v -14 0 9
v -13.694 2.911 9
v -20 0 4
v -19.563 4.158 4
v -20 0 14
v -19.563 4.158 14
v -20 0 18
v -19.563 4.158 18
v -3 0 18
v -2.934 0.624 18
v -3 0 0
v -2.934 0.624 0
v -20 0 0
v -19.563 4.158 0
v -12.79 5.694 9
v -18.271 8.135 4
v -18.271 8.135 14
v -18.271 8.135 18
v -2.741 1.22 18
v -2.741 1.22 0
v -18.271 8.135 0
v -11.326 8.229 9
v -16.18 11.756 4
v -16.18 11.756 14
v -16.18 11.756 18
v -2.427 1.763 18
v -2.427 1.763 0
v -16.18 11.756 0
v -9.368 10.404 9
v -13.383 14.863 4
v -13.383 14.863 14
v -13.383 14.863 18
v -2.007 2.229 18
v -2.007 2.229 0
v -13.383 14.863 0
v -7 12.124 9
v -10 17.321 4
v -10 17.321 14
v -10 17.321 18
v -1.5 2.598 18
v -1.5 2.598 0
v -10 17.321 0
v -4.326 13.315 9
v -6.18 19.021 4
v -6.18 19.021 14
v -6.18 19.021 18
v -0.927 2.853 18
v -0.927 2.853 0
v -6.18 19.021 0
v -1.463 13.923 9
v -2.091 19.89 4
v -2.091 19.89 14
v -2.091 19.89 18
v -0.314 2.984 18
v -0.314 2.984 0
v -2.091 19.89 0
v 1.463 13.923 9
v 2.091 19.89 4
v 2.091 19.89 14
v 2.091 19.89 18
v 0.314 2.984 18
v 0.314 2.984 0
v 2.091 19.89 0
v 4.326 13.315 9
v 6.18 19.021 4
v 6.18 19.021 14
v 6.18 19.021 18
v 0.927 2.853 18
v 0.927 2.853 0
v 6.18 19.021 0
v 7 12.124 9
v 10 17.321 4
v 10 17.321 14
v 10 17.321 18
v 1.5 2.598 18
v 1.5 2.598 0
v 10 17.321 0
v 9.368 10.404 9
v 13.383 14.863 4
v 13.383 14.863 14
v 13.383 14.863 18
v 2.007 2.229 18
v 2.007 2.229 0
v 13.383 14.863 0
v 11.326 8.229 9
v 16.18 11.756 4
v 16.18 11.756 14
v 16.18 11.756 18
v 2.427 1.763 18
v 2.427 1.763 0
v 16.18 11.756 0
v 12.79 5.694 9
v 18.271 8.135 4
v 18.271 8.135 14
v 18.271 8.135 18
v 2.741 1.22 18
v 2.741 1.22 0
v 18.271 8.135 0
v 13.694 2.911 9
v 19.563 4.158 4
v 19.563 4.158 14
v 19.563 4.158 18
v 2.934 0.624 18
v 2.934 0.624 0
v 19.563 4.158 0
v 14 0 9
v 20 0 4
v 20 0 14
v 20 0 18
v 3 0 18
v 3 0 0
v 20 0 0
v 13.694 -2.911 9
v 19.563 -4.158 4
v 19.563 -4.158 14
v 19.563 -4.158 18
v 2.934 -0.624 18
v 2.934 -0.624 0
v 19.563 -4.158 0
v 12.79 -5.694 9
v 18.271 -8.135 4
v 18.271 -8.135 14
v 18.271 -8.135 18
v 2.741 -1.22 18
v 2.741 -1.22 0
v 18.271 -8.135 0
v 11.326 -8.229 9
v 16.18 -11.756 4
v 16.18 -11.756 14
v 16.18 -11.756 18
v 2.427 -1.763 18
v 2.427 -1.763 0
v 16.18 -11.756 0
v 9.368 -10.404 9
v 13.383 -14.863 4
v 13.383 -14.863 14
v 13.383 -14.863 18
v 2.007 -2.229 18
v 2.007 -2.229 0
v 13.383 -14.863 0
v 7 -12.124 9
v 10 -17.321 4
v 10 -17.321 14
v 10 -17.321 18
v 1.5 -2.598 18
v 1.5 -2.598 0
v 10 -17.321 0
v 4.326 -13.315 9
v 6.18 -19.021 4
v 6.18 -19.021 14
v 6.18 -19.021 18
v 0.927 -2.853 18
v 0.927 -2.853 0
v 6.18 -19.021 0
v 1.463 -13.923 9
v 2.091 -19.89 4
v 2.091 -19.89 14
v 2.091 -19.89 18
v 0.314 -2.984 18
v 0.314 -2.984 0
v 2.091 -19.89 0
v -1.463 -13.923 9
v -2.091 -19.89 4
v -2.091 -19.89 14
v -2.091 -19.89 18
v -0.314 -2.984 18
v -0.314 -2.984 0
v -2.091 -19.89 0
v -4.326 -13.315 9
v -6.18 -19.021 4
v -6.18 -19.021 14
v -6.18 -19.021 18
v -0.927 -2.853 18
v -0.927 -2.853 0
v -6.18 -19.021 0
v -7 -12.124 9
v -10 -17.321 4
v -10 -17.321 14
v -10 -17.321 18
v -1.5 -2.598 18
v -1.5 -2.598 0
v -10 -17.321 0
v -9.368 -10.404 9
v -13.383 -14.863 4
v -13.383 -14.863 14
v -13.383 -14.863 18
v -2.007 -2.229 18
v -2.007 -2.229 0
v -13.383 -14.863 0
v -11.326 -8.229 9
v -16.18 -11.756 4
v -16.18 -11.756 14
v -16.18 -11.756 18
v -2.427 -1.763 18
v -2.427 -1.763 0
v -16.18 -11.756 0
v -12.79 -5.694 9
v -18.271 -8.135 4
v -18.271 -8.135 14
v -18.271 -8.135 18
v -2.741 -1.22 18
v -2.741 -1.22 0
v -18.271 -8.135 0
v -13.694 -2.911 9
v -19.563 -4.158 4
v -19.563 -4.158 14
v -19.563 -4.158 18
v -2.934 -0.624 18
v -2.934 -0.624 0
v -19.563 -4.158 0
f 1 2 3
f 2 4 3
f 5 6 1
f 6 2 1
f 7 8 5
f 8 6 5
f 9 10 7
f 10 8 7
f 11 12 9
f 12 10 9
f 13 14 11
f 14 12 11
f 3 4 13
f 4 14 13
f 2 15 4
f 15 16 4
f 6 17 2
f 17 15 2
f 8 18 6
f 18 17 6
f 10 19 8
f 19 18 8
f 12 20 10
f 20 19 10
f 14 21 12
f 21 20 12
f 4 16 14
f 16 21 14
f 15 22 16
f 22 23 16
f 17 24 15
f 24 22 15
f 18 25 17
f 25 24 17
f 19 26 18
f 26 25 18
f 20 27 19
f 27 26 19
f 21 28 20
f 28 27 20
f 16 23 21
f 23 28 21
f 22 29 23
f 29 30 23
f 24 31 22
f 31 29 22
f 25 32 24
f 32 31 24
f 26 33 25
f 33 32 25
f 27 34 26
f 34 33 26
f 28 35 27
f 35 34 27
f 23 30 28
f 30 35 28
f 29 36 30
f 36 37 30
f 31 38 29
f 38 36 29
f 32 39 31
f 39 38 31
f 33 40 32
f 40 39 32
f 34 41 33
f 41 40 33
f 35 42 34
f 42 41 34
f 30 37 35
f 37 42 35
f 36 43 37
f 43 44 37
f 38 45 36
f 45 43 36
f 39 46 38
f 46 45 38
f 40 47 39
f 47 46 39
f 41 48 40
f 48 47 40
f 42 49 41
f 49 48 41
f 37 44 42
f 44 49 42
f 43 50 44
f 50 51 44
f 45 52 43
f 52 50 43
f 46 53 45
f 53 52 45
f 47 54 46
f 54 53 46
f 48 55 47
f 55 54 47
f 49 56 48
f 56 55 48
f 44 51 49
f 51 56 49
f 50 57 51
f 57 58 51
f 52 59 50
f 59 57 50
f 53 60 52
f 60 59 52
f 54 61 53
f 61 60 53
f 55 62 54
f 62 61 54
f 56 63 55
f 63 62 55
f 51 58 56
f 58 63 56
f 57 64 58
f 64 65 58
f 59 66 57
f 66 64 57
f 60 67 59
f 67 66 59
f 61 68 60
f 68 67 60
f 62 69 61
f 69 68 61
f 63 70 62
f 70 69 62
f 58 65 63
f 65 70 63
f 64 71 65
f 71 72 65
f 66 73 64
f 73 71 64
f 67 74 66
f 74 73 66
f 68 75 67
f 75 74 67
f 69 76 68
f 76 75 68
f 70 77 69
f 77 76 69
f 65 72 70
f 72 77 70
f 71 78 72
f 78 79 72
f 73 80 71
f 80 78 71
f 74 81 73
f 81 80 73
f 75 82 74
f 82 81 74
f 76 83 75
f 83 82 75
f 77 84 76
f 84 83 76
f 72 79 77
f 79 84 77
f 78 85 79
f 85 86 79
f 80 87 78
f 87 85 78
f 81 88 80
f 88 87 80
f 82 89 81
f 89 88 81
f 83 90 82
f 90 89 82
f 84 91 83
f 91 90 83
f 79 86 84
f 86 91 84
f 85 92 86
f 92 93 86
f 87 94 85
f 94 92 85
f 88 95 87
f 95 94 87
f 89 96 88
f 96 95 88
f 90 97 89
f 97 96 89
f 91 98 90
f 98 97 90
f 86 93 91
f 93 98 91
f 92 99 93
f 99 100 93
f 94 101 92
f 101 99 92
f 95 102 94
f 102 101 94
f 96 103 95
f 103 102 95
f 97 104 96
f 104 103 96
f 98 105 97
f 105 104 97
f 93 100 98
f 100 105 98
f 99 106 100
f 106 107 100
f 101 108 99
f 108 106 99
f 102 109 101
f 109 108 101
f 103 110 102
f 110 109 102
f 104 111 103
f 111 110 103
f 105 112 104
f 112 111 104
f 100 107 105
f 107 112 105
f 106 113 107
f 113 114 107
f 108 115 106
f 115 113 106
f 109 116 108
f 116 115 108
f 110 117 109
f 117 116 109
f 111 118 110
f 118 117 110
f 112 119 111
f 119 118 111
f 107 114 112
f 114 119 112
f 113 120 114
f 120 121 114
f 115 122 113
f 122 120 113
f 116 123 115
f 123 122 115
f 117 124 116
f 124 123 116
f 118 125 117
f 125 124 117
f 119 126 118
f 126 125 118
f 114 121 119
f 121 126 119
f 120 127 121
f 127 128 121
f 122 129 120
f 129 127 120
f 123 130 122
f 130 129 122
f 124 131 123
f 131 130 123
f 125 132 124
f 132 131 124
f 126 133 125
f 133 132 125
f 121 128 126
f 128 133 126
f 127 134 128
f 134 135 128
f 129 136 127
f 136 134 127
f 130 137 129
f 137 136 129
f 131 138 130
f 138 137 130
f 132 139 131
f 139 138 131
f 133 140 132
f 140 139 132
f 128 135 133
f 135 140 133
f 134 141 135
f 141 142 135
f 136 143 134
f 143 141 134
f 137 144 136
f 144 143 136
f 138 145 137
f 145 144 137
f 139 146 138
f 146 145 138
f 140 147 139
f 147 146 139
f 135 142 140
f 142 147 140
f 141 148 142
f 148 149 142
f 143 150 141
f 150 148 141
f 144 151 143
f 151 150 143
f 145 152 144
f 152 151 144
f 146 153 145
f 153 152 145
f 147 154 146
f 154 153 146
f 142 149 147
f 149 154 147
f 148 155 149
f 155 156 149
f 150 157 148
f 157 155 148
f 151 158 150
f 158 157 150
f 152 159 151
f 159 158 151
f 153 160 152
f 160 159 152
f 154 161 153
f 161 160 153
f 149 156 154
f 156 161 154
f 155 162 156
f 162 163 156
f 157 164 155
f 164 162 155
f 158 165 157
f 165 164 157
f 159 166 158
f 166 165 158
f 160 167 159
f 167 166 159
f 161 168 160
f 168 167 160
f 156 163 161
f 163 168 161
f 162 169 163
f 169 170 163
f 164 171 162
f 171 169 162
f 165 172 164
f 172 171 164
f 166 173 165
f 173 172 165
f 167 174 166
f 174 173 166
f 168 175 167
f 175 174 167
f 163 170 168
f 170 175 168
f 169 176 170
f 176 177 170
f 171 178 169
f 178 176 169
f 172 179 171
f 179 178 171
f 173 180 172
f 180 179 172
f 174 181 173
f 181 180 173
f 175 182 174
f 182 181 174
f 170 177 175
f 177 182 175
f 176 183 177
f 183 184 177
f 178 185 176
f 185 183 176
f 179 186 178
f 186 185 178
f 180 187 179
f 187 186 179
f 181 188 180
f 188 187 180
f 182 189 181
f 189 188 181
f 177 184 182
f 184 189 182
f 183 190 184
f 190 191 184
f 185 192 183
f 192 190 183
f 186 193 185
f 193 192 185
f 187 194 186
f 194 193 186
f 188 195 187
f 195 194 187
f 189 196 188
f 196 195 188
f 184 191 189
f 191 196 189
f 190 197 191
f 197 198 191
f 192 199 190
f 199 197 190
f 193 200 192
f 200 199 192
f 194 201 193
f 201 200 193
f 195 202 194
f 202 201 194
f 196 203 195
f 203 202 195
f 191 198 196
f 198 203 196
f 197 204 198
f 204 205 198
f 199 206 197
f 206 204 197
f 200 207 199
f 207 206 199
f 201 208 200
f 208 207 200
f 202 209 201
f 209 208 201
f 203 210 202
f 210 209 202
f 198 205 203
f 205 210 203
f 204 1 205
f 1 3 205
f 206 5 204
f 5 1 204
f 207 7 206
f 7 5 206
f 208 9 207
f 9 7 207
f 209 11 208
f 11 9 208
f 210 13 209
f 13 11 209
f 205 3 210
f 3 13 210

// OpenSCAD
// V-groove pulley, defined entirely by one revolved profile.
// Showcases: rotate_extrude -> exact CONICAL + CYLINDRICAL surfaces of revolution
// (the V-groove walls are true cones, not facets) and the bore comes free from
// the profile's inner radius. A lathe/CAM tool reads this STEP as real geometry.
rotate_extrude()
  polygon([[3, 0], [20, 0], [20, 4], [14, 9], [20, 14], [20, 18], [3, 18]]);
